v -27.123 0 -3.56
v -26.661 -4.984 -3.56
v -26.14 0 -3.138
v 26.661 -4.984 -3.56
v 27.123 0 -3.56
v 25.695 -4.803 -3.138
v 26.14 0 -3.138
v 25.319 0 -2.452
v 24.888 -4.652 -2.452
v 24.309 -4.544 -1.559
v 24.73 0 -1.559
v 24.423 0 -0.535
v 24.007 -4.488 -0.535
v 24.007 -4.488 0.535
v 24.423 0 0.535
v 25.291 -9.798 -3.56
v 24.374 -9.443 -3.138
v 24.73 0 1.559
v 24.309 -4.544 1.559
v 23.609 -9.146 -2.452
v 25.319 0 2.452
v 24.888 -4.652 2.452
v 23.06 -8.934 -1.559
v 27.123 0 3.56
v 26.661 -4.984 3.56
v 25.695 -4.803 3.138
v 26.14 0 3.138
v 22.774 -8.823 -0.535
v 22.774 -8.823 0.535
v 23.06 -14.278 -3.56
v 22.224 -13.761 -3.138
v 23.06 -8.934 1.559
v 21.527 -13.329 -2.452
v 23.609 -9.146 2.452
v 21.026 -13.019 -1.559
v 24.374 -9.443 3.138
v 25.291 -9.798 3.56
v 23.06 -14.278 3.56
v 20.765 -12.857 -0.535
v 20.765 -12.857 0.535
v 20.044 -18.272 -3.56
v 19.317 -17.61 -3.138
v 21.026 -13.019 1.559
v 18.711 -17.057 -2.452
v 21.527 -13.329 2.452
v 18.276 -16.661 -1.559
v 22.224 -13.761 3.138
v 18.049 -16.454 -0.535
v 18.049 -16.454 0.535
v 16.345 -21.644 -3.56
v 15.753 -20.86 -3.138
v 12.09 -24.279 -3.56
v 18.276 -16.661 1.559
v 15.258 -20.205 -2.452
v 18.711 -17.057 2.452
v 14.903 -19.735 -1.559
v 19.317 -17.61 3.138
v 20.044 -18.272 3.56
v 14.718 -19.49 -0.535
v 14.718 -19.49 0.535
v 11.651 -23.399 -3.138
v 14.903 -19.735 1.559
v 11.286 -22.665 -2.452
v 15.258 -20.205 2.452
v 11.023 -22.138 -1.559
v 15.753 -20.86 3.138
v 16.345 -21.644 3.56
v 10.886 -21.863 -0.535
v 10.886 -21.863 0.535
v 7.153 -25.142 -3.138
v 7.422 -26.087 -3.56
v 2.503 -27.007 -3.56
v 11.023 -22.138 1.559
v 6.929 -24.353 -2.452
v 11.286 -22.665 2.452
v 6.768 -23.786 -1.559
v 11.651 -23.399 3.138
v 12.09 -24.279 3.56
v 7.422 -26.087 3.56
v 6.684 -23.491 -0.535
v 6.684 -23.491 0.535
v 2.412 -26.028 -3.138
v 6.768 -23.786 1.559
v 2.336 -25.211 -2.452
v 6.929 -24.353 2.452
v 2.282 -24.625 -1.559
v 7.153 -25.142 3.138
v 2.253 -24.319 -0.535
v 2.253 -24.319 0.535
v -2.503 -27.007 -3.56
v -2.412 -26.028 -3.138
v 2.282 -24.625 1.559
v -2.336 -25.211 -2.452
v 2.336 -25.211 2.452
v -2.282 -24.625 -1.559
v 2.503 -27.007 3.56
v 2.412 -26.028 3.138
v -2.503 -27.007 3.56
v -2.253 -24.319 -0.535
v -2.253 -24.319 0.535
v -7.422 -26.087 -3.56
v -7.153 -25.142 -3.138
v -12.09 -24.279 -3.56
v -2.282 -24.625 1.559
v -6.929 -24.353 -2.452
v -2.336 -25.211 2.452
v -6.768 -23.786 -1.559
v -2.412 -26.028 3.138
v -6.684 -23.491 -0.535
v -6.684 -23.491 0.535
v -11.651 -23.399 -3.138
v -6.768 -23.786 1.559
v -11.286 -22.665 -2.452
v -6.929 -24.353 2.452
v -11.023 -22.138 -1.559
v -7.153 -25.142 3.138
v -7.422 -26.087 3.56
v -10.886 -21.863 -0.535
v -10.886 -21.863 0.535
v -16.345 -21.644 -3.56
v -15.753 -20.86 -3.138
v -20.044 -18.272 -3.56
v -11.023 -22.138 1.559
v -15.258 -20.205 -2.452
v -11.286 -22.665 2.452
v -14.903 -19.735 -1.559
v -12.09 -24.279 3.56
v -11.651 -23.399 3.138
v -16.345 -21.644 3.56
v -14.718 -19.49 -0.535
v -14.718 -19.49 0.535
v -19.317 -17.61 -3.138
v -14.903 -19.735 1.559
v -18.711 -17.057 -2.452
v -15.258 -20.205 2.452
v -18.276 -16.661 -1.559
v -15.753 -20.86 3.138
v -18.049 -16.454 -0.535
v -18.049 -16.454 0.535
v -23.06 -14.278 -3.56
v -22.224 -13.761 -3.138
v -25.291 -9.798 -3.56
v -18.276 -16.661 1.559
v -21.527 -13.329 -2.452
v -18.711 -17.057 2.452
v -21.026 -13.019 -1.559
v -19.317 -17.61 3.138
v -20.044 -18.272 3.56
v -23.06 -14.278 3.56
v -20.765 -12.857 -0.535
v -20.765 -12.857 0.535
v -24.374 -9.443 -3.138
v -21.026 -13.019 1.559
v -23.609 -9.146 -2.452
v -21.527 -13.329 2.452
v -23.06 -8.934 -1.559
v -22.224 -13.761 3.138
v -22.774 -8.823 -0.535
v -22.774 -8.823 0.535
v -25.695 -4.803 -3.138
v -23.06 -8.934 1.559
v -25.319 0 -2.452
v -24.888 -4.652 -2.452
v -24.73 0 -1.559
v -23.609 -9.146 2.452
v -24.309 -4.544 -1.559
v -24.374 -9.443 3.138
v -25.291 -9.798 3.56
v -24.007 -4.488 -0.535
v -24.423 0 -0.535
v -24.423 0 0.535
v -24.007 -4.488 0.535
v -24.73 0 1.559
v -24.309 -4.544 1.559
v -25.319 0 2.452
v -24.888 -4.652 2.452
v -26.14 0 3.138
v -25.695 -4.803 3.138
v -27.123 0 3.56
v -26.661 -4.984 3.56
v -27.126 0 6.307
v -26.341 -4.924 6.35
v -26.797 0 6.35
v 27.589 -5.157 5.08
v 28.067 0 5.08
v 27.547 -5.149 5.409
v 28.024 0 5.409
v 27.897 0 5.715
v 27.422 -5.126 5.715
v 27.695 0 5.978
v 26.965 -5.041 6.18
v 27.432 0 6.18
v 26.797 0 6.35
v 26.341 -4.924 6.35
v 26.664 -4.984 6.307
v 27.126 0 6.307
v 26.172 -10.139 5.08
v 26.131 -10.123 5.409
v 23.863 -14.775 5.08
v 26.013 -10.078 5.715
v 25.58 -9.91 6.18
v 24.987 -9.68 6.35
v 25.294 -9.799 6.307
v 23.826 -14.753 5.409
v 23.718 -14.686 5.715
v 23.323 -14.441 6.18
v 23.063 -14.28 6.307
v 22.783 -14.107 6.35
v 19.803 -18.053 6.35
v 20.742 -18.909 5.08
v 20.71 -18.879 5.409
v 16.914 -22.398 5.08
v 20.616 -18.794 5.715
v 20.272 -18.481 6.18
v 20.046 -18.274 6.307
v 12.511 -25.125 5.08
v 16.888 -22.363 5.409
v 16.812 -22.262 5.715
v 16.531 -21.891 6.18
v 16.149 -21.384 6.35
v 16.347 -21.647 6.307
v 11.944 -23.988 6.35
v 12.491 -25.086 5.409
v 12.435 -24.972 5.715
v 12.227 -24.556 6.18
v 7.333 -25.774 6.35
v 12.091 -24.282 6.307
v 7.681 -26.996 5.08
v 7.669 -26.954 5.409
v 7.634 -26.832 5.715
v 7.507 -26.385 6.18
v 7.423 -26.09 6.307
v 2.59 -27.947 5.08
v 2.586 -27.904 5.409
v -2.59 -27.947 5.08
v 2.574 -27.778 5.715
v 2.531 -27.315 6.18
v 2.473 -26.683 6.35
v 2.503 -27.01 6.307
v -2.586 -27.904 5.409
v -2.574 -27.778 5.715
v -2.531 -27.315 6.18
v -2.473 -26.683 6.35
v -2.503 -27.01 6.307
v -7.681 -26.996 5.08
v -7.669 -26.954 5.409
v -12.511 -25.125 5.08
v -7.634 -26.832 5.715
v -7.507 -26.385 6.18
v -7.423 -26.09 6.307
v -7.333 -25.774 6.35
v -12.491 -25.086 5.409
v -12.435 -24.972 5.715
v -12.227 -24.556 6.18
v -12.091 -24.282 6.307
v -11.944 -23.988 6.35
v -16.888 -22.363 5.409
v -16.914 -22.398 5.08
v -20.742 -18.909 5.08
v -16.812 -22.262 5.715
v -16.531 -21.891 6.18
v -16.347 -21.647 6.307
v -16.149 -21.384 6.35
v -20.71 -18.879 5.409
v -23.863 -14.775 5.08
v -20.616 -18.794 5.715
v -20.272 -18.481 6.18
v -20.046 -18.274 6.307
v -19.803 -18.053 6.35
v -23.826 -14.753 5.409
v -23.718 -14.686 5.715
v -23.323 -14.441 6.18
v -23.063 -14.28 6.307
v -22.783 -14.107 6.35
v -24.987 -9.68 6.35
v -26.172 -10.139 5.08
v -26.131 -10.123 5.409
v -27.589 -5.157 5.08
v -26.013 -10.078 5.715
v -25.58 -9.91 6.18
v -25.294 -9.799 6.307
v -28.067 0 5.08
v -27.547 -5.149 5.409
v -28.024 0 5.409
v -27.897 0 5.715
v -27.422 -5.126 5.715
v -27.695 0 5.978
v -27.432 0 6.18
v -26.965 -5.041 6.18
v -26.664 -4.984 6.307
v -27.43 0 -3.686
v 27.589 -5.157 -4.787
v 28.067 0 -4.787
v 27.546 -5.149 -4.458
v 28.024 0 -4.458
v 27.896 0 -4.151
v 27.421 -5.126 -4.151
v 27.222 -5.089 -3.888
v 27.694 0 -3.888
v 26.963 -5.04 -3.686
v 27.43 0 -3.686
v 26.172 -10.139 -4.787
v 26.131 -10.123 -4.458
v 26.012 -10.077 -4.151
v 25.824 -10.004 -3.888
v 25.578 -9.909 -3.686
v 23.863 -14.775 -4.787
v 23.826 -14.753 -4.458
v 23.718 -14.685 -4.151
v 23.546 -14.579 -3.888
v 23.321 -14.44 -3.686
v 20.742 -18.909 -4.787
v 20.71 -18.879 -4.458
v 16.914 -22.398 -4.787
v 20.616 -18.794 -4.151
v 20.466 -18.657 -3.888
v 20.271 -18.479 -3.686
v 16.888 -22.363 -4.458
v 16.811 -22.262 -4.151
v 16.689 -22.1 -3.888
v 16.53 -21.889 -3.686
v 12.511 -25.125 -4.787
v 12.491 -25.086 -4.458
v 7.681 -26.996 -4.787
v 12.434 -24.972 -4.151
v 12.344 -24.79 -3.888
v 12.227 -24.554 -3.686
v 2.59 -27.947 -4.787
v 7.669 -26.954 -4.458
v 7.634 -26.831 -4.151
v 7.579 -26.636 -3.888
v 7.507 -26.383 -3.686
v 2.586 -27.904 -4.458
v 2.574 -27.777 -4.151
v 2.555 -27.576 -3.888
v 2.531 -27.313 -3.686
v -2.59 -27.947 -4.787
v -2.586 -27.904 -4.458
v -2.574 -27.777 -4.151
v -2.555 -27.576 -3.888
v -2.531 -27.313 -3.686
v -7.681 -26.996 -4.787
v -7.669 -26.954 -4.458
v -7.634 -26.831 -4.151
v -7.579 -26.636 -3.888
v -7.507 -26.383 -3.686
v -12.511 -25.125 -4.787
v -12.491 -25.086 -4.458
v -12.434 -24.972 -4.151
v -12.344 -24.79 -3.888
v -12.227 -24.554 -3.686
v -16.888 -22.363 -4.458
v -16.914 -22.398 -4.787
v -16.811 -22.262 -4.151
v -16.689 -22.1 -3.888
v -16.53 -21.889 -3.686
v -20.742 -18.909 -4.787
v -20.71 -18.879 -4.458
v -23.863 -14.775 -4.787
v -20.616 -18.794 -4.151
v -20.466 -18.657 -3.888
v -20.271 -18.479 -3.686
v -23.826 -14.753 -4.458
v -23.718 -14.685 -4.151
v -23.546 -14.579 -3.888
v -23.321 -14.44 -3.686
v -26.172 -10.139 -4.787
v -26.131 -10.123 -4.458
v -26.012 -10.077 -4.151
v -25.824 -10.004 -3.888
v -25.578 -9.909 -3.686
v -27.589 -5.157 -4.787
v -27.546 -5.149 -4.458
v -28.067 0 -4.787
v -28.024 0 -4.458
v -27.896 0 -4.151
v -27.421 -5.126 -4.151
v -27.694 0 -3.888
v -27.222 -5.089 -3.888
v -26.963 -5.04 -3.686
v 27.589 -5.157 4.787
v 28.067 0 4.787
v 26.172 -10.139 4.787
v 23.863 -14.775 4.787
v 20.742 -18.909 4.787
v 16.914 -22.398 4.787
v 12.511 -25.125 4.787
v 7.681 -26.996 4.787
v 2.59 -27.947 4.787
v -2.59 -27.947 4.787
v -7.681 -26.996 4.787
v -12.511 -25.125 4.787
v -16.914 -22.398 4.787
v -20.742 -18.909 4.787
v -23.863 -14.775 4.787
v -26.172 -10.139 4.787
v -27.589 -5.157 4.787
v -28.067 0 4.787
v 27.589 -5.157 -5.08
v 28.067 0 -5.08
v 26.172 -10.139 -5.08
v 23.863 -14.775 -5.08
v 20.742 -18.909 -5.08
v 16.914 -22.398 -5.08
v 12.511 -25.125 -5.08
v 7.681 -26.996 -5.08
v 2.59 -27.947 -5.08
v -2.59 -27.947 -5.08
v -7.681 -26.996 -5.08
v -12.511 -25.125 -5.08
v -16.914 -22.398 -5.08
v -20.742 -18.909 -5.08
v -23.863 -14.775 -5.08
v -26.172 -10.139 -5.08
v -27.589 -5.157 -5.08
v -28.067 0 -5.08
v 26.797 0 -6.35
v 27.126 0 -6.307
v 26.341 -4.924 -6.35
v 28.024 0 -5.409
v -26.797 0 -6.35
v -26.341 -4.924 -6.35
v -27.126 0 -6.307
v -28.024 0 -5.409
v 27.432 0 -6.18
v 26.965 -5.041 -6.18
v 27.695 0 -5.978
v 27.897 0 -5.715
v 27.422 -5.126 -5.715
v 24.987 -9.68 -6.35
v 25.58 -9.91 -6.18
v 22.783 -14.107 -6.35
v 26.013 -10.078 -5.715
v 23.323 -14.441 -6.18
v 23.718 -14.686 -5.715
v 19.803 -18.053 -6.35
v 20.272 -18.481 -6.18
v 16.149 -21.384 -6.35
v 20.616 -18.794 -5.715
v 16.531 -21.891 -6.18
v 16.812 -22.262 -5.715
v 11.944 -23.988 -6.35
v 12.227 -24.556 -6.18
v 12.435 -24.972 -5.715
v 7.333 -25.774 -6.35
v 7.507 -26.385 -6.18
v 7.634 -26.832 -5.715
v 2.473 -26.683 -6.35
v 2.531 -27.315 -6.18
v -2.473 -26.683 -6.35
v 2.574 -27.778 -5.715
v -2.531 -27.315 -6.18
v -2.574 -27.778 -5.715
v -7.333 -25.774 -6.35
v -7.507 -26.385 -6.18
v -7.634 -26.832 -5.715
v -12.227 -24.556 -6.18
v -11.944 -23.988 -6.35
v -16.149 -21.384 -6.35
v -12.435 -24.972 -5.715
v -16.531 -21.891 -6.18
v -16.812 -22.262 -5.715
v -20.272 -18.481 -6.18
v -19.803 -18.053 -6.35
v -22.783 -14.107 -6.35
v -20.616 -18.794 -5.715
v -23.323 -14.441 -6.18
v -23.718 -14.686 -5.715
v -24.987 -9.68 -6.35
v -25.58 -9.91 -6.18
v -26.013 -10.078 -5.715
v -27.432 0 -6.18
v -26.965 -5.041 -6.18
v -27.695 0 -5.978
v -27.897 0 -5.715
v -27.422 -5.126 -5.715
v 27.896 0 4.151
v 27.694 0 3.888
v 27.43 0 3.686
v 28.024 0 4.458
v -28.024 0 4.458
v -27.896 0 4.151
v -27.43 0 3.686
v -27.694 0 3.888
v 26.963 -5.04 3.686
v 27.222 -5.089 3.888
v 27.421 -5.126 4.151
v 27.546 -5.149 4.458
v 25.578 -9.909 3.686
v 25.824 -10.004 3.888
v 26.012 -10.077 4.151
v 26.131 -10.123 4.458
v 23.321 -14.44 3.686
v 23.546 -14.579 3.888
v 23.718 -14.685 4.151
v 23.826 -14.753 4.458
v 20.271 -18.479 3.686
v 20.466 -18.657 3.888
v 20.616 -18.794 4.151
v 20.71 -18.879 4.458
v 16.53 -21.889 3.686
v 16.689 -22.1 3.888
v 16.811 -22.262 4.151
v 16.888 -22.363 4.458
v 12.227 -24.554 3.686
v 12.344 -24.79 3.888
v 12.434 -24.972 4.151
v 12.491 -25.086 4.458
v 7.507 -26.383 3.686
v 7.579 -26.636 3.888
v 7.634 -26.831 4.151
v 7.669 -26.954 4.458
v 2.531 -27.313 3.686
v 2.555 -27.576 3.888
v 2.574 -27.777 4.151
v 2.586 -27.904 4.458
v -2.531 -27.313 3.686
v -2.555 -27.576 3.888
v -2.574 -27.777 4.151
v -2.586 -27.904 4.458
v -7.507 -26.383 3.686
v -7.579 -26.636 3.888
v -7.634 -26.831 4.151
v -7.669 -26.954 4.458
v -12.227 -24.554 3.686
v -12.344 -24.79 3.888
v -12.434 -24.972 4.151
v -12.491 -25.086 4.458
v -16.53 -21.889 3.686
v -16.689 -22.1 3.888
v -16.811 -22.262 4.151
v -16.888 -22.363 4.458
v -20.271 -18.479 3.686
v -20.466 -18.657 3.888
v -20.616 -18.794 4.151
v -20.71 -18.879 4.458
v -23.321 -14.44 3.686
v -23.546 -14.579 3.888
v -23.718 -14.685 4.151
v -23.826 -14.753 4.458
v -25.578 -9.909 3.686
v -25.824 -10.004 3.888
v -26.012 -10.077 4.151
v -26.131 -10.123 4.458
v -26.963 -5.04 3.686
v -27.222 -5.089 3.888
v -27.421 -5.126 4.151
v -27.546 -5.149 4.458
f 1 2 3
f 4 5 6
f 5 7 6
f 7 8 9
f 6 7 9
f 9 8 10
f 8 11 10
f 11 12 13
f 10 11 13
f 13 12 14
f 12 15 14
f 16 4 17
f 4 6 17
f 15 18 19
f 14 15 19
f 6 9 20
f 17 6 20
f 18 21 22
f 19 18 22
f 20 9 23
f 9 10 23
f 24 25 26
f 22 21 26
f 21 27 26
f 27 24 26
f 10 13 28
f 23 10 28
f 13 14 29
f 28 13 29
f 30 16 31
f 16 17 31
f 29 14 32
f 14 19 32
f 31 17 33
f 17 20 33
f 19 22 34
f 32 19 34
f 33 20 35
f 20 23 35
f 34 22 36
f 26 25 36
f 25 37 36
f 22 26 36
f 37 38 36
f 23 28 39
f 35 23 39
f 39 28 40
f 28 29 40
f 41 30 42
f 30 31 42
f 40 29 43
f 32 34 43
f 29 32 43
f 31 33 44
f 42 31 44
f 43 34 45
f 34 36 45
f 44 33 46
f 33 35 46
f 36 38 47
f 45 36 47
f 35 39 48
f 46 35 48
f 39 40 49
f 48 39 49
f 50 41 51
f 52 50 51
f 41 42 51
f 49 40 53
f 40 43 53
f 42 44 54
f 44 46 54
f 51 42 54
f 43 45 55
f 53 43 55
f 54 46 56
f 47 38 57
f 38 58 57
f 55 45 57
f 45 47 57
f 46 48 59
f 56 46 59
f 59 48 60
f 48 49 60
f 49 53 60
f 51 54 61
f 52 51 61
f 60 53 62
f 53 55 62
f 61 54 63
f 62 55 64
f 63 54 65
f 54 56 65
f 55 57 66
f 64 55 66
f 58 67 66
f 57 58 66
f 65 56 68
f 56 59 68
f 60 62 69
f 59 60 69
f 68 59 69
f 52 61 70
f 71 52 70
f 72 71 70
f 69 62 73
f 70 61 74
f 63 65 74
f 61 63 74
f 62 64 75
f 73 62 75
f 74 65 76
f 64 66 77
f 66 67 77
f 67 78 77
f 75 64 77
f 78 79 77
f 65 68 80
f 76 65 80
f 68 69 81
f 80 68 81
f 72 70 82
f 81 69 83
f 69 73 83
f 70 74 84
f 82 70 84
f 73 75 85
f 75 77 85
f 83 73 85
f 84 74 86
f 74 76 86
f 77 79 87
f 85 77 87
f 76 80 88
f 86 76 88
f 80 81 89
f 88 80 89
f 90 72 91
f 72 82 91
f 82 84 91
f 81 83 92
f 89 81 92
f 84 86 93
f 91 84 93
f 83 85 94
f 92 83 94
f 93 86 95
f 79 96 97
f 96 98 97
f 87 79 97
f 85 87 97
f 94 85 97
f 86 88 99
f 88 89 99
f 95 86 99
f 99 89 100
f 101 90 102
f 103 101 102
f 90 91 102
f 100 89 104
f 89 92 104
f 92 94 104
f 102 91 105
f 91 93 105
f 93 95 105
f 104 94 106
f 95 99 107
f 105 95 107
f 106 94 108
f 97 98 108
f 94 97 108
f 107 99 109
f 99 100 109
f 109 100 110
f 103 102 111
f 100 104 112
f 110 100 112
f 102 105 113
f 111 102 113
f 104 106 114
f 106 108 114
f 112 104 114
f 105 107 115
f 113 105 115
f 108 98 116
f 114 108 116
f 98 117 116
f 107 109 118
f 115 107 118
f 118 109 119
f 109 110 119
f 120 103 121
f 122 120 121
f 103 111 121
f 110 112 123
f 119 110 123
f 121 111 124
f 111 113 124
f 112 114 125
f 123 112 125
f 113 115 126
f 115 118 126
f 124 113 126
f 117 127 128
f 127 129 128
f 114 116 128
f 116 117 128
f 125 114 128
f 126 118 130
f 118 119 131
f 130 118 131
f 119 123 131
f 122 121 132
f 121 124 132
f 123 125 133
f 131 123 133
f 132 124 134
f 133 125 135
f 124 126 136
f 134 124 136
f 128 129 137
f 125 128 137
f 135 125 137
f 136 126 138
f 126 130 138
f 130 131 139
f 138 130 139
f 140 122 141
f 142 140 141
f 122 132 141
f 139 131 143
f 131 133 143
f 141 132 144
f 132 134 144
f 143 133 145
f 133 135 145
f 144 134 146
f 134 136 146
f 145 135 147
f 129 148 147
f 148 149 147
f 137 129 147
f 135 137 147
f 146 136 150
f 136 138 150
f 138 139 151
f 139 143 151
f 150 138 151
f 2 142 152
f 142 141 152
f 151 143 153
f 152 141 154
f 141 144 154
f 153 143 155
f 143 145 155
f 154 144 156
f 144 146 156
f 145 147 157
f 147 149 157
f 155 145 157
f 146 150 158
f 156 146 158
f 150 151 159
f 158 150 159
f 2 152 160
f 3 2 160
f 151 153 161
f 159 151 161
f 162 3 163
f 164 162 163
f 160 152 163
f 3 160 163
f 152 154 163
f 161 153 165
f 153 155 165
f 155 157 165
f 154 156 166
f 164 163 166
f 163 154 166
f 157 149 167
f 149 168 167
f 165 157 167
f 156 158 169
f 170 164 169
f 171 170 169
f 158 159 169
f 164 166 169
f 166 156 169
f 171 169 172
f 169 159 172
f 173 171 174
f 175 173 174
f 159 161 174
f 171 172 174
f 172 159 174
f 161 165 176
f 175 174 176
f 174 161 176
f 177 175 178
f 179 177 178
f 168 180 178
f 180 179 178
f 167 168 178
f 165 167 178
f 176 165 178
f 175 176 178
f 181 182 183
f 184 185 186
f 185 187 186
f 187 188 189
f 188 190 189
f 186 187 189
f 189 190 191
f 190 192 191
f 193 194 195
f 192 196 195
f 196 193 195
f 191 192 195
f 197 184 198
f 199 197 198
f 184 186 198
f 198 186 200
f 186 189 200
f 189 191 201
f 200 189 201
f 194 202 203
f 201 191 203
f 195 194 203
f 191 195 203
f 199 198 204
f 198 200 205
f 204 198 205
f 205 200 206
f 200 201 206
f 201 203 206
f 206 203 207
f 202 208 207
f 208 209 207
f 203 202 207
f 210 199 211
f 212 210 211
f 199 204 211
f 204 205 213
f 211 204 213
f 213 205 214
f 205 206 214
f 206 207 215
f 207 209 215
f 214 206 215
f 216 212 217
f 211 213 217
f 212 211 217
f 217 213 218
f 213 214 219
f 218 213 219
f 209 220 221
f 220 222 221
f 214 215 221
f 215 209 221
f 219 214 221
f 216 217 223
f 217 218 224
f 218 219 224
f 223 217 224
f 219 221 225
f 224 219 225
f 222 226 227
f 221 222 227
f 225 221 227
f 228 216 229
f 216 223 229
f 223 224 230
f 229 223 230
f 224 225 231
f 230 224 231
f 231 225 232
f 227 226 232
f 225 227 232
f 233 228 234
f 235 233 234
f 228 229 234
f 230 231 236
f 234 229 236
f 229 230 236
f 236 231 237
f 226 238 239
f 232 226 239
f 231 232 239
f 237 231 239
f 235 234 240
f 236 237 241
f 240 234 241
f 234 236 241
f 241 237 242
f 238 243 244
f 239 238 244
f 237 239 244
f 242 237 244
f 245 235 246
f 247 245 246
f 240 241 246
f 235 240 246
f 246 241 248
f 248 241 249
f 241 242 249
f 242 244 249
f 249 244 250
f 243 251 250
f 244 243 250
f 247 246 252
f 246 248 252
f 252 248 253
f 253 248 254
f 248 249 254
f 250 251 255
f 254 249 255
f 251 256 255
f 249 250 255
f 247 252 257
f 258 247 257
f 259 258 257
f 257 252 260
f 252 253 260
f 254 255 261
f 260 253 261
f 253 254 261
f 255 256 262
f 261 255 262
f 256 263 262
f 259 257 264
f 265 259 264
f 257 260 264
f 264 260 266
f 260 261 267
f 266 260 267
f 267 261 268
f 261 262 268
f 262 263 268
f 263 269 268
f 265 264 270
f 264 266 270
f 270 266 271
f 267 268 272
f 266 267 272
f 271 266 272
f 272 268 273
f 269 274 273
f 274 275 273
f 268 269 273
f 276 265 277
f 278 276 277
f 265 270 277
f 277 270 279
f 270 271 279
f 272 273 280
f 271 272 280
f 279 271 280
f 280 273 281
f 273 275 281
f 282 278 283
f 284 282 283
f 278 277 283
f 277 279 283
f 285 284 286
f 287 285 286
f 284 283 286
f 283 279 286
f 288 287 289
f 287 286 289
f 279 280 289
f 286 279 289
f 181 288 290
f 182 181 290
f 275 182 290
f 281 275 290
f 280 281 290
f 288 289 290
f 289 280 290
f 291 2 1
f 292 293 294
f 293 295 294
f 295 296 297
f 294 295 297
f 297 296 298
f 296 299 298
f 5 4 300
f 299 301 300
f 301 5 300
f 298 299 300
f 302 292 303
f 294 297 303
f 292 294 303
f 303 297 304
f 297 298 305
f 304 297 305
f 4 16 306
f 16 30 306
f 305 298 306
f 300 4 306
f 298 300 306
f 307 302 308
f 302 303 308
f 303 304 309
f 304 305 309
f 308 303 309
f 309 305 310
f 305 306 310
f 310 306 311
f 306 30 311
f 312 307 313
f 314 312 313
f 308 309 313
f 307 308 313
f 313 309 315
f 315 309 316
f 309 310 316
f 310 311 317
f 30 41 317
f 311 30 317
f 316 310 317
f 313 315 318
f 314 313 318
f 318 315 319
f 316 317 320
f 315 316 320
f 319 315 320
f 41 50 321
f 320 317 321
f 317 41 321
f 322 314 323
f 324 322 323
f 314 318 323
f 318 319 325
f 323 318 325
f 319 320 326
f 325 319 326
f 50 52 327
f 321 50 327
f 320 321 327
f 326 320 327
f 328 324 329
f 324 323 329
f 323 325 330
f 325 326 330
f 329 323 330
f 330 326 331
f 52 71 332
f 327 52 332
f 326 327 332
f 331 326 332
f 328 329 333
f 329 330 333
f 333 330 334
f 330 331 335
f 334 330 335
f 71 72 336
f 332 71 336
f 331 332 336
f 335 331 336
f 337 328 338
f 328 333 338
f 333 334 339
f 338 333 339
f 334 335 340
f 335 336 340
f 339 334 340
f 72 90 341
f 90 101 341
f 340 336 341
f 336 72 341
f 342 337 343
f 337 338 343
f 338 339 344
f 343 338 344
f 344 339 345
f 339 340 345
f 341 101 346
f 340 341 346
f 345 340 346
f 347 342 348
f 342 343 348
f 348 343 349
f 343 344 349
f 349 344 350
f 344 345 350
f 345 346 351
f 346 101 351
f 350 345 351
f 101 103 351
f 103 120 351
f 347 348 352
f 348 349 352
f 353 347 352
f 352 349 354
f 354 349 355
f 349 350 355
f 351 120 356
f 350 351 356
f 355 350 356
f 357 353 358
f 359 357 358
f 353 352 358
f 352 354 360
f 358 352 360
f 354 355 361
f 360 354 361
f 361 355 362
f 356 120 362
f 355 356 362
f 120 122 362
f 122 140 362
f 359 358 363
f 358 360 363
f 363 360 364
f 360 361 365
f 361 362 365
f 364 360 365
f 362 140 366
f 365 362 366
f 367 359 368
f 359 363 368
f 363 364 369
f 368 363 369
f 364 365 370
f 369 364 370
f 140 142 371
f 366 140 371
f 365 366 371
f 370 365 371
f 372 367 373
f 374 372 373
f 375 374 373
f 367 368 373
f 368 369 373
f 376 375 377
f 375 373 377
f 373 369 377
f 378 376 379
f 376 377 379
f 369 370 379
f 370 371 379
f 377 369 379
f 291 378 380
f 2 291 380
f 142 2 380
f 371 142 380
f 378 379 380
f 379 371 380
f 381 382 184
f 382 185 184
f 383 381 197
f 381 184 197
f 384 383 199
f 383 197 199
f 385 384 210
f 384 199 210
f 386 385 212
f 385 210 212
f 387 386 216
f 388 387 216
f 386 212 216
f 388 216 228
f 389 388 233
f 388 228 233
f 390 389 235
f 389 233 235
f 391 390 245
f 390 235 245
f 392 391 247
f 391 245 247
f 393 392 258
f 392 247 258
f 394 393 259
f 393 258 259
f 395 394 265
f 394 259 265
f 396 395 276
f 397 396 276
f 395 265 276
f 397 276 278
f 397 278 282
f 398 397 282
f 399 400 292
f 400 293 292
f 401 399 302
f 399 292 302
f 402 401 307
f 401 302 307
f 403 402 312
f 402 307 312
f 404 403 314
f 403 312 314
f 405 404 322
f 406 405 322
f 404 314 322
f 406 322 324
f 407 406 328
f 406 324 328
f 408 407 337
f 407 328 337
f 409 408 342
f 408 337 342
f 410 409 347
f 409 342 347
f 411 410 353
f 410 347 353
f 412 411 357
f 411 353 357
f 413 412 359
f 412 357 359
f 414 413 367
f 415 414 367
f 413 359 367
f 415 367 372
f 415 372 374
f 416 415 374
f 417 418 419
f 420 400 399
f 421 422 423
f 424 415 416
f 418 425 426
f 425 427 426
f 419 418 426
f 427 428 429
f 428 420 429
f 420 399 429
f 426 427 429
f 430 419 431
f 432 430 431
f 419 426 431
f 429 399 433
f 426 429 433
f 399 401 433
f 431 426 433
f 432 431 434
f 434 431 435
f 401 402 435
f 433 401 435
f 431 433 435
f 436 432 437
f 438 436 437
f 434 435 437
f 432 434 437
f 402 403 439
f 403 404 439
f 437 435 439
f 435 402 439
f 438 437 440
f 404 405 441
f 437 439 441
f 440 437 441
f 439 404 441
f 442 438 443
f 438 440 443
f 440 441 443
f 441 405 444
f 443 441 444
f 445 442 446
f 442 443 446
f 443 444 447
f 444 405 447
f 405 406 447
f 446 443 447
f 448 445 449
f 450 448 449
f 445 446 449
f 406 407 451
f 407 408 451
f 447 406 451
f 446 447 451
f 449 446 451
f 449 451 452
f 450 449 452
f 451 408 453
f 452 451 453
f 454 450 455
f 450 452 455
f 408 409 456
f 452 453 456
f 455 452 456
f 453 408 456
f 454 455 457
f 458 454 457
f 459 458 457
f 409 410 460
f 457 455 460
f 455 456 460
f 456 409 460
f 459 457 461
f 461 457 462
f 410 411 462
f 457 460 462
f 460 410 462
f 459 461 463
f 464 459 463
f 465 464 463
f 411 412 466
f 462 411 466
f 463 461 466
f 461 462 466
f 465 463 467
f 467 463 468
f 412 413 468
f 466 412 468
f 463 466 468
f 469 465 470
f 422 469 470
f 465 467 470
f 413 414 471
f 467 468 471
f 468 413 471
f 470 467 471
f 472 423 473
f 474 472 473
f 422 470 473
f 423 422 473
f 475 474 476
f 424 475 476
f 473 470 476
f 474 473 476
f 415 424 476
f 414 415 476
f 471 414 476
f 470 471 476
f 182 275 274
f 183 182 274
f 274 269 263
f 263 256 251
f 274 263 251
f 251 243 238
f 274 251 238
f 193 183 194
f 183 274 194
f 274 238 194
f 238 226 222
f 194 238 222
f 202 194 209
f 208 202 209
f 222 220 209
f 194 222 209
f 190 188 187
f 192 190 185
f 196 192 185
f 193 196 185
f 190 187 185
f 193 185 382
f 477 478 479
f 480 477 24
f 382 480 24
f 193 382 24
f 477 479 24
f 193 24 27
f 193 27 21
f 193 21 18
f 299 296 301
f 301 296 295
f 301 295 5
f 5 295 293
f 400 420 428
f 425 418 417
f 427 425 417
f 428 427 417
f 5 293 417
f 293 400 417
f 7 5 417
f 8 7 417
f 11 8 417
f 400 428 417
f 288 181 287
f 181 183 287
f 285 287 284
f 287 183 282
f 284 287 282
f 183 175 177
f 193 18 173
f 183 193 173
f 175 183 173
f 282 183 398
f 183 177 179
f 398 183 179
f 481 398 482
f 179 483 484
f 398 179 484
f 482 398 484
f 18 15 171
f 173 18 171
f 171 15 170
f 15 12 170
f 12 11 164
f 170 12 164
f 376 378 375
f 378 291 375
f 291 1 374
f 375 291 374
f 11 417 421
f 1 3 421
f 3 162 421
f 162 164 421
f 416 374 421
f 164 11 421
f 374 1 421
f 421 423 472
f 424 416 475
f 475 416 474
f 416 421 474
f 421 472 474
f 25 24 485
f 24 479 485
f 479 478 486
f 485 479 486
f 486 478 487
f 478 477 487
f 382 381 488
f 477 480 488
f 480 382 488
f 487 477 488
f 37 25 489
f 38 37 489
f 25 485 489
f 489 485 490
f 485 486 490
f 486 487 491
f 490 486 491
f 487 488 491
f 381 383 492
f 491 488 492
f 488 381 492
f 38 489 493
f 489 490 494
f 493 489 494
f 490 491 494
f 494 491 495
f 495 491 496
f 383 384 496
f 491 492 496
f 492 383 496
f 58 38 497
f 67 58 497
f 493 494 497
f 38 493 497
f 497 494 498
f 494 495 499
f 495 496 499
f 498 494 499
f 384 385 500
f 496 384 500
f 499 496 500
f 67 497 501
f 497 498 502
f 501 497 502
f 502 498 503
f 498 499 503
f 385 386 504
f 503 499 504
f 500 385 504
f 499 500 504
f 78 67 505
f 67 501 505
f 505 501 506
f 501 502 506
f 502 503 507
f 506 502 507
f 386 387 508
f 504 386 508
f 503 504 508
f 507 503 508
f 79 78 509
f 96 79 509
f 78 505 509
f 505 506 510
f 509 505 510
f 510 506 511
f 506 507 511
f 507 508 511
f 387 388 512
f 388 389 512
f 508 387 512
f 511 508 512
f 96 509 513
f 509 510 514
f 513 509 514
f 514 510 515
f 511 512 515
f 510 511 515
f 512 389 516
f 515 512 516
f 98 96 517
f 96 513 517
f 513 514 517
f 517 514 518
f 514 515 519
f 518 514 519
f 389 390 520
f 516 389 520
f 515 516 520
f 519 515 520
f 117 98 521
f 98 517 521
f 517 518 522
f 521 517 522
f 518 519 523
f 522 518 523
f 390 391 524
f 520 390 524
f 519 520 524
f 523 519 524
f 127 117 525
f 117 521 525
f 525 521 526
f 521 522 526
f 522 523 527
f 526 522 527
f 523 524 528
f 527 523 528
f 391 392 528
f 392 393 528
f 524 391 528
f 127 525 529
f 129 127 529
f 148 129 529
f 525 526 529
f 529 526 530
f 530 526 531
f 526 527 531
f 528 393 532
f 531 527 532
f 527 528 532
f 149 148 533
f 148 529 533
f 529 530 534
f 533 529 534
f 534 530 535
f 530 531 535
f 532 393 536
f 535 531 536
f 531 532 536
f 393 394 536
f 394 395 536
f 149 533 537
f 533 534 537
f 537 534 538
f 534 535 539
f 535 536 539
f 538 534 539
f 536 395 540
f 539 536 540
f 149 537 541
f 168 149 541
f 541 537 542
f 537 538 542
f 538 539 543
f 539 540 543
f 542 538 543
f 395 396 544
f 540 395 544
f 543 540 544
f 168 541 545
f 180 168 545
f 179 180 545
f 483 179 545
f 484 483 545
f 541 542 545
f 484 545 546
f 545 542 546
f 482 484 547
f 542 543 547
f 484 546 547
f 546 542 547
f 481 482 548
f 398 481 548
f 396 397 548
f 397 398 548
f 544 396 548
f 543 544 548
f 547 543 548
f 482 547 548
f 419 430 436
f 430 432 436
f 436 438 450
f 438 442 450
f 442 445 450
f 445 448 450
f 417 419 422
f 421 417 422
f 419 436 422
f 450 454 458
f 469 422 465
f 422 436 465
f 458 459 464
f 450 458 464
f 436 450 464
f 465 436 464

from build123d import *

# Parameters (mm, degrees)
REVOLVE1_ANGLE = 180


with BuildPart() as part:
    # Sketch1 → Revolve1 (revolve)
    with BuildSketch(Plane(origin=(0, 0, 0), x_dir=(1, 0, 0), z_dir=(0, 1, 0))):
        with BuildLine():
            Line((0, -6.35), (0, 6.35))
            Line((0, 6.35), (26.797, 6.35))
            ThreePointArc((26.797, 6.35), (27.695025612, 5.978025612), (28.067, 5.08))
            Line((28.067, 5.08), (28.067, 4.787411514))
            ThreePointArc((28.067, 4.787411514), (27.803594283, 4.013029212), (27.122641026, 3.5598701))
            ThreePointArc((27.122641026, 3.5598701), (24.384, 0), (27.122641026, -3.5598701))
            ThreePointArc((27.122641026, -3.5598701), (27.803594283, -4.013029212), (28.067, -4.787411514))
            Line((28.067, -4.787411514), (28.067, -5.08))
            ThreePointArc((28.067, -5.08), (27.695025612, -5.978025612), (26.797, -6.35))
            Line((26.797, -6.35), (0, -6.35))
        make_face()
    revolve(axis=Axis((0, 0, 6.35), (0, 0, -1)), revolution_arc=REVOLVE1_ANGLE)


solid = part.part
